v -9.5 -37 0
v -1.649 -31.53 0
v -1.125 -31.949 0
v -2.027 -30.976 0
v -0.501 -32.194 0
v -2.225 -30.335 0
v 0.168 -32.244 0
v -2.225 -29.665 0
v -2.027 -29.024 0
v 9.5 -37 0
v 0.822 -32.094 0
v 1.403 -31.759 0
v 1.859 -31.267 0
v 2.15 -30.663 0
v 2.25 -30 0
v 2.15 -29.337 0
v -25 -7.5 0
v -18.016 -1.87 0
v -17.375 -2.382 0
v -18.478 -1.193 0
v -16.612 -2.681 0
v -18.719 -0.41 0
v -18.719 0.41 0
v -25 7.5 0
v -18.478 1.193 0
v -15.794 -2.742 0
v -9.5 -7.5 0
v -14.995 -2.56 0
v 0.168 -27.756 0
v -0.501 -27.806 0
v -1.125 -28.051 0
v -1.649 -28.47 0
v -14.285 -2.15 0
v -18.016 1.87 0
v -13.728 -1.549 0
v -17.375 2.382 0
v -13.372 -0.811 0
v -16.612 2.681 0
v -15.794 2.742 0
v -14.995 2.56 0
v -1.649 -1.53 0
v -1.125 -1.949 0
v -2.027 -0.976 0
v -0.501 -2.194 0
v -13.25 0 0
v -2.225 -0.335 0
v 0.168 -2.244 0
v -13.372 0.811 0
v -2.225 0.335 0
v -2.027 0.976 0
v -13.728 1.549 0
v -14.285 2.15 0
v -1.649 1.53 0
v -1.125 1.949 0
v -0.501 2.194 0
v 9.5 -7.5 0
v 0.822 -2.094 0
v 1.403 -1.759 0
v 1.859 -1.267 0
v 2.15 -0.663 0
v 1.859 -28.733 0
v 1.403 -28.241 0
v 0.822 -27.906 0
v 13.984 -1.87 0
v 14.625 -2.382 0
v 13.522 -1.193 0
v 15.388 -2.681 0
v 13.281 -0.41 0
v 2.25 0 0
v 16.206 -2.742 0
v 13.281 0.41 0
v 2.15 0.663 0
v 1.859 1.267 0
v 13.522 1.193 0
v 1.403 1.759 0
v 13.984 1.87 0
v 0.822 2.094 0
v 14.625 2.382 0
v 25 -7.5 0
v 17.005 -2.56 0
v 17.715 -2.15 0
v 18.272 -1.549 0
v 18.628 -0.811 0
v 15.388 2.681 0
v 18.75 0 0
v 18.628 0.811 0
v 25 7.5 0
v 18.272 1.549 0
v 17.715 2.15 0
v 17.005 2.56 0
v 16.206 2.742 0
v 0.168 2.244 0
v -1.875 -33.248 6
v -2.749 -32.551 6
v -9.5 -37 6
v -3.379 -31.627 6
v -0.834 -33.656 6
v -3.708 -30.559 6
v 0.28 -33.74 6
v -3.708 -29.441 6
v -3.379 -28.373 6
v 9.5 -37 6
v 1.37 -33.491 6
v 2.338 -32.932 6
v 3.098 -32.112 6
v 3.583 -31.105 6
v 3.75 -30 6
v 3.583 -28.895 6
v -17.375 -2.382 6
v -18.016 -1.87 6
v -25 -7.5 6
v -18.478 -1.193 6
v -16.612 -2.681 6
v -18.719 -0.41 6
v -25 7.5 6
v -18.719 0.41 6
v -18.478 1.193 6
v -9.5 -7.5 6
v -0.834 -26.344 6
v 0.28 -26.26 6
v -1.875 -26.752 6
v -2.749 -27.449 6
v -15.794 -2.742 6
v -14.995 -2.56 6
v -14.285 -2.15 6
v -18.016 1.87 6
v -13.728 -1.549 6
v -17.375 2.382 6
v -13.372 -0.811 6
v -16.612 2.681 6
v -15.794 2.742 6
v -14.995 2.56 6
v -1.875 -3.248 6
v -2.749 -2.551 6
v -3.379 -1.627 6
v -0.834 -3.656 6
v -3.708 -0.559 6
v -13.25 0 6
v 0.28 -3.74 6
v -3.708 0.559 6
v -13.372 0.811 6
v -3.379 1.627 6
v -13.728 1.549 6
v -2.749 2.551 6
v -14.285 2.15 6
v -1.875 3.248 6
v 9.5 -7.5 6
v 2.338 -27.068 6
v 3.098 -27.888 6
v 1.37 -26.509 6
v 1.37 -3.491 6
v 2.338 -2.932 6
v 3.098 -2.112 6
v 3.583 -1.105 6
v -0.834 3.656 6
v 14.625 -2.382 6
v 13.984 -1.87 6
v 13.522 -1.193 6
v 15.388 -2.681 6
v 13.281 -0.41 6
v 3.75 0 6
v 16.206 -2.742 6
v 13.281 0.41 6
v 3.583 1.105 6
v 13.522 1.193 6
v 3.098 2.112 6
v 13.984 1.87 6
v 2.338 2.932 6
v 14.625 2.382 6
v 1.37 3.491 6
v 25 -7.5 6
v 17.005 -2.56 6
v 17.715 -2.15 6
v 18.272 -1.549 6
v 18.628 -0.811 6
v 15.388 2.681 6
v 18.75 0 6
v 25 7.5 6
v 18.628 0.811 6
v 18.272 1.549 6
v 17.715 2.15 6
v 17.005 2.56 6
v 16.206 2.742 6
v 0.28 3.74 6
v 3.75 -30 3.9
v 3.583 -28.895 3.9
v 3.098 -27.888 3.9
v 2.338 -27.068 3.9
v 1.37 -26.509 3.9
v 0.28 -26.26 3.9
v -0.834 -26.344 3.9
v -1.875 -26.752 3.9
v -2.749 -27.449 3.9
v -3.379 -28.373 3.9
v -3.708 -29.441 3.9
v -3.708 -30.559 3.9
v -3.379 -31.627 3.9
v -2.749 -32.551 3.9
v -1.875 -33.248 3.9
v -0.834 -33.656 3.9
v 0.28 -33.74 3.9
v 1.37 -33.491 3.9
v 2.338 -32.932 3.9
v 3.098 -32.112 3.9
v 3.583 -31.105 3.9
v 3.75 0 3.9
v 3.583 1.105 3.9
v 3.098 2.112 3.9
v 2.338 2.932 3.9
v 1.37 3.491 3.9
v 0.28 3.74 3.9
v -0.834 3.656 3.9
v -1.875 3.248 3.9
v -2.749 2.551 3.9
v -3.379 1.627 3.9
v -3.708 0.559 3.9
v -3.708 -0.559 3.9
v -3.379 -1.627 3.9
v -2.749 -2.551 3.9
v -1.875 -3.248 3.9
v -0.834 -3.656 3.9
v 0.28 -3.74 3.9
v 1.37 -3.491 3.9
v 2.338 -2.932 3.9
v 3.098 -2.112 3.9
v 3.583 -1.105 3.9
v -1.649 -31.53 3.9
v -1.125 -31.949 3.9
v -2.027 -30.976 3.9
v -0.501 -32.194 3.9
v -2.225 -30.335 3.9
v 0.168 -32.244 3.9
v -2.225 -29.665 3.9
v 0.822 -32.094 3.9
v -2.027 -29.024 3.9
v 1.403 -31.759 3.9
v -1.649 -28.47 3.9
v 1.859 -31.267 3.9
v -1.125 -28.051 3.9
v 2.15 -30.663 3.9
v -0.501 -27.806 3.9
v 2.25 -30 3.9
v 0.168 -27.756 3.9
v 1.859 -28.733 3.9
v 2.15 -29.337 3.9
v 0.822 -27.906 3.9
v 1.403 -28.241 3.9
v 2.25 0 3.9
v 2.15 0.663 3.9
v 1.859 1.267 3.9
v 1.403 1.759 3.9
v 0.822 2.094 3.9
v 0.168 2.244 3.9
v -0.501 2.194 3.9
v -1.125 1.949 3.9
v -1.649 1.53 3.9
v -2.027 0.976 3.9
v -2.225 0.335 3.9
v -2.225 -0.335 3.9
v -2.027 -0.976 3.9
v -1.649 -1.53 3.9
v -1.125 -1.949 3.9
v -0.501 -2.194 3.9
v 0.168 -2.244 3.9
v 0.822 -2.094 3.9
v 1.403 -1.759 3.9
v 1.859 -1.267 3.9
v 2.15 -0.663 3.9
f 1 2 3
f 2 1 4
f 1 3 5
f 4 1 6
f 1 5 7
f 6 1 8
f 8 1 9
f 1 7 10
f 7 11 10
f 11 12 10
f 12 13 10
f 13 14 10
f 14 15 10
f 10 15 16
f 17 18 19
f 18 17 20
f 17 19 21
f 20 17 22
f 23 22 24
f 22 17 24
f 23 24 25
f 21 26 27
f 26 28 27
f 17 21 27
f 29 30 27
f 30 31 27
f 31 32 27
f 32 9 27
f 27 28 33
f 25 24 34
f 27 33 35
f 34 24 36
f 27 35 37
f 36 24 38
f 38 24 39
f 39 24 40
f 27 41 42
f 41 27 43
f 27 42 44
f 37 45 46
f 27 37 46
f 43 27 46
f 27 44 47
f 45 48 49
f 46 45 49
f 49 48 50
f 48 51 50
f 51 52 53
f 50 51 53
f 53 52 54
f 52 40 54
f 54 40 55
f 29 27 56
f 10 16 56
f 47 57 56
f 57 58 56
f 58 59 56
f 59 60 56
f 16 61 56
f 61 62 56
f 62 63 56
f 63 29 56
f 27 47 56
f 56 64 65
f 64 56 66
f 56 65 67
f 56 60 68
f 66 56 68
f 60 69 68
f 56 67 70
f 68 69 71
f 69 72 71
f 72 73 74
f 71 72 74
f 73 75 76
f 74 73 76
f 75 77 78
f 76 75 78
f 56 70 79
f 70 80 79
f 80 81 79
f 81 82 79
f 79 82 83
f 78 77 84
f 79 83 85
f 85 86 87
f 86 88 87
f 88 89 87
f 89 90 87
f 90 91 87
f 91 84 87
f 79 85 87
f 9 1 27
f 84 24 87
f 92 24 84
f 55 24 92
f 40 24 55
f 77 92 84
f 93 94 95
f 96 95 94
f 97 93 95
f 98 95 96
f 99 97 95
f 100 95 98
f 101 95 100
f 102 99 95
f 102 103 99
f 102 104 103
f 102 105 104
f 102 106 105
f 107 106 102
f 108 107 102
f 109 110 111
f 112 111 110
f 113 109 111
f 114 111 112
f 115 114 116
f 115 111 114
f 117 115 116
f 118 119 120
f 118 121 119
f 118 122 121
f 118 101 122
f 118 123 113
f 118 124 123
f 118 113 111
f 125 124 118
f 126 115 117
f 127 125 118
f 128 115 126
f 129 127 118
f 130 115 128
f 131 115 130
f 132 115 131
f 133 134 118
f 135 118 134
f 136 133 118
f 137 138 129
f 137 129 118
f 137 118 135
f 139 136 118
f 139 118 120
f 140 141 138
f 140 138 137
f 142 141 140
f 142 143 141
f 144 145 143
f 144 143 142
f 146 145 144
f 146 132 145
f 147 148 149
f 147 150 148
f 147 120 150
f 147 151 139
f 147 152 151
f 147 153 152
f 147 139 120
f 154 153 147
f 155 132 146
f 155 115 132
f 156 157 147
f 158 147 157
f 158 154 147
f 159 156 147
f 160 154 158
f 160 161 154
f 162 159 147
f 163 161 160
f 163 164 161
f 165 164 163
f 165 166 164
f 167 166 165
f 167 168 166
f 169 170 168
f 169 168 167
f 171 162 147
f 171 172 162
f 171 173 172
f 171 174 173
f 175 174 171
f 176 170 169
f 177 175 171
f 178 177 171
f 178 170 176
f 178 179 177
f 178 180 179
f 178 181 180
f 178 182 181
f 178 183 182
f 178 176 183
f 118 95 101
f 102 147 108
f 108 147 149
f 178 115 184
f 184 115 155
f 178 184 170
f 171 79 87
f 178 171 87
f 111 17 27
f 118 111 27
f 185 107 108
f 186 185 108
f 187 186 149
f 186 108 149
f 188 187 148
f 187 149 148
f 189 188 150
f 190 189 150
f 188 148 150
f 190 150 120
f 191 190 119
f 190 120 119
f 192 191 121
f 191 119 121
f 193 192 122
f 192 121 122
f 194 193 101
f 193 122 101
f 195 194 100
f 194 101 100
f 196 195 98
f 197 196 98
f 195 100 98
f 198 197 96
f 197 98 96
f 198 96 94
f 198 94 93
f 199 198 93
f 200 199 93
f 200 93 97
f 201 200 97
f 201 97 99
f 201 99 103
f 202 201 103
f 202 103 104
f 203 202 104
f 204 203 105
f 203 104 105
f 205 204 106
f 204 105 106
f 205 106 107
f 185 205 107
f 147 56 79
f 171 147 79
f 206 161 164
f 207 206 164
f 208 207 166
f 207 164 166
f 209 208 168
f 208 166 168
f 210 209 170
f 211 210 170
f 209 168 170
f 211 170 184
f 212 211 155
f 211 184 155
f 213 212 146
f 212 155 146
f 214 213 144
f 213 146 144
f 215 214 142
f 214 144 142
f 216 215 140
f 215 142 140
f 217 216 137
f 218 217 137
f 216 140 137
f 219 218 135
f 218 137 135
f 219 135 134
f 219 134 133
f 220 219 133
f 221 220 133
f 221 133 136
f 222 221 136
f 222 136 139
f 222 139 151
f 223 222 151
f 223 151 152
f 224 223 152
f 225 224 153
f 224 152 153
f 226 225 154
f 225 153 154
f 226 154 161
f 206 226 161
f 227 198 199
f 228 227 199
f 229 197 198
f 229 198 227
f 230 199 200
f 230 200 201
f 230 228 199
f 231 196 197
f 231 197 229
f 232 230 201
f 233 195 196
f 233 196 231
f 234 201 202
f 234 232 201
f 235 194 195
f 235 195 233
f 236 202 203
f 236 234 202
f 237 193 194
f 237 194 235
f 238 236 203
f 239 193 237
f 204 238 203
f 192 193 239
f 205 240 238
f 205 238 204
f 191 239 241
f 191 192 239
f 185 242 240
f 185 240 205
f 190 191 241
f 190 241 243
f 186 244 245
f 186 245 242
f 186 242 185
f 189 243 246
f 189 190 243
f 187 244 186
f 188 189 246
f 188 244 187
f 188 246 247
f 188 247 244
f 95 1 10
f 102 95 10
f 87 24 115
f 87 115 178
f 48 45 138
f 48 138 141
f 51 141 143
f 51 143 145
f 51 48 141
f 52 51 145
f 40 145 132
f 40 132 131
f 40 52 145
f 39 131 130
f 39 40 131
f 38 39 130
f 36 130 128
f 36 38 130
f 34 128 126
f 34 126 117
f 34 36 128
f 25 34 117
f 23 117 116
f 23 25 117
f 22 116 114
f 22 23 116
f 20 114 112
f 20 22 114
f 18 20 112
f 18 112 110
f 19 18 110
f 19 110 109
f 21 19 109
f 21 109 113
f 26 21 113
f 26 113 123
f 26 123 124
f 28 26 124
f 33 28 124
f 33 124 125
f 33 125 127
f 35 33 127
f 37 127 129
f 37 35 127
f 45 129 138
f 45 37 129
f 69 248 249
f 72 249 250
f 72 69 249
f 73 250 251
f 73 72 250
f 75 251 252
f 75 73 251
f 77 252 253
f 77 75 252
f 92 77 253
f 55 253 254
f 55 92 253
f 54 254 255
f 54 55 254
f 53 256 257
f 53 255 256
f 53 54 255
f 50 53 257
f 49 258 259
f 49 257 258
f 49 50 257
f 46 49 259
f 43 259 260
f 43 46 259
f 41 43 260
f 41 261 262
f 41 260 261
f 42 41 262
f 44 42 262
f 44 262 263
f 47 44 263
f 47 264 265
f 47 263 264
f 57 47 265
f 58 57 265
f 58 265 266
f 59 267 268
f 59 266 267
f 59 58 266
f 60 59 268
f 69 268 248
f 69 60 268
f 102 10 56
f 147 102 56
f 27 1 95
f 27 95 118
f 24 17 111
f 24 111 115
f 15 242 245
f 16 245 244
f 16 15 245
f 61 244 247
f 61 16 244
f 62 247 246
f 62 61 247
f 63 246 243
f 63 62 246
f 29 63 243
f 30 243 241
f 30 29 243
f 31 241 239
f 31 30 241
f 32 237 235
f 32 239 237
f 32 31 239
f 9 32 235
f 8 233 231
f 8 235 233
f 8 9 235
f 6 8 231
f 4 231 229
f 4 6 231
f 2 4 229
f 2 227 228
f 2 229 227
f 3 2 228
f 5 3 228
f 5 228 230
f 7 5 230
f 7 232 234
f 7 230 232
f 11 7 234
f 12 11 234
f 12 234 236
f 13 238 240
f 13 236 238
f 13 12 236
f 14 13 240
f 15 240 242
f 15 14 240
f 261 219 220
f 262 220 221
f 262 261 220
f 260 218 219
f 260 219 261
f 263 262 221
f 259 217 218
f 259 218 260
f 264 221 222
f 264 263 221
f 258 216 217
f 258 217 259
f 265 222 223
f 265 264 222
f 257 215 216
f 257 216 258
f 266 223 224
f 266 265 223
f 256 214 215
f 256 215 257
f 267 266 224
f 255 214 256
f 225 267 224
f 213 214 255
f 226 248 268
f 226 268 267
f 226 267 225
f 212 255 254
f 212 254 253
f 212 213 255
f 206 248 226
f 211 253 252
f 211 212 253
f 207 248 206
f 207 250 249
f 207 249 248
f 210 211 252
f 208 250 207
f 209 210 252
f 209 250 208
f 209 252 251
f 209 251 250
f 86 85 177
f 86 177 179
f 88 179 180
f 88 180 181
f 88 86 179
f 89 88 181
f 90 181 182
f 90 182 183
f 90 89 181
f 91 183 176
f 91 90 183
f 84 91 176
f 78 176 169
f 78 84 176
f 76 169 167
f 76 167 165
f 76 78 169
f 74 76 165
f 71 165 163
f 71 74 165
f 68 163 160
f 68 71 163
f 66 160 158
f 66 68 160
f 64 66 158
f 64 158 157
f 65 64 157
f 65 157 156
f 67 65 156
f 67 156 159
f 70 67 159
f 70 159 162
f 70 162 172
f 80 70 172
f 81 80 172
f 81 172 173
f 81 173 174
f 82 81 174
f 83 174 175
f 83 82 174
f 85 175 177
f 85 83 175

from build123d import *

# Parameters (mm, degrees)
SKETCH7_W           = 50
SKETCH7_H           = 15
SKETCH7_R           = 2.25
SKETCH7_R_2         = 2.75
SKETCH7_W_2         = 19
SKETCH7_H_2         = 29.5
BOSS_EXTRUDE3_DEPTH = 6
SKETCH8_R           = 3.75
CUT_EXTRUDE4_DEPTH  = 2.1


with BuildPart() as part:
    # Sketch7 → Boss-Extrude3 (new body)
    # profile 1 of 2: a face of its own
    with BuildSketch(Plane.XY):
        Rectangle(SKETCH7_W, SKETCH7_H)
        Circle(SKETCH7_R, mode=Mode.SUBTRACT)
        with Locations((-16, 0)):
            Circle(SKETCH7_R_2, mode=Mode.SUBTRACT)
        with Locations((16, 0)):
            Circle(SKETCH7_R_2, mode=Mode.SUBTRACT)
    # profile 2 of 2: a face of its own
    with BuildSketch(Plane.XY):
        with Locations((0, -22.25)):
            Rectangle(SKETCH7_W_2, SKETCH7_H_2)
        with Locations((0, -30)):
            Circle(SKETCH7_R, mode=Mode.SUBTRACT)
    extrude(amount=BOSS_EXTRUDE3_DEPTH)

    # Sketch8 → Cut-Extrude4 (cut)
    with BuildSketch(Plane.XY.offset(6)):
        Circle(SKETCH8_R)
        with Locations((0, -30)):
            Circle(SKETCH8_R)
    extrude(amount=-CUT_EXTRUDE4_DEPTH, mode=Mode.SUBTRACT)


solid = part.part
